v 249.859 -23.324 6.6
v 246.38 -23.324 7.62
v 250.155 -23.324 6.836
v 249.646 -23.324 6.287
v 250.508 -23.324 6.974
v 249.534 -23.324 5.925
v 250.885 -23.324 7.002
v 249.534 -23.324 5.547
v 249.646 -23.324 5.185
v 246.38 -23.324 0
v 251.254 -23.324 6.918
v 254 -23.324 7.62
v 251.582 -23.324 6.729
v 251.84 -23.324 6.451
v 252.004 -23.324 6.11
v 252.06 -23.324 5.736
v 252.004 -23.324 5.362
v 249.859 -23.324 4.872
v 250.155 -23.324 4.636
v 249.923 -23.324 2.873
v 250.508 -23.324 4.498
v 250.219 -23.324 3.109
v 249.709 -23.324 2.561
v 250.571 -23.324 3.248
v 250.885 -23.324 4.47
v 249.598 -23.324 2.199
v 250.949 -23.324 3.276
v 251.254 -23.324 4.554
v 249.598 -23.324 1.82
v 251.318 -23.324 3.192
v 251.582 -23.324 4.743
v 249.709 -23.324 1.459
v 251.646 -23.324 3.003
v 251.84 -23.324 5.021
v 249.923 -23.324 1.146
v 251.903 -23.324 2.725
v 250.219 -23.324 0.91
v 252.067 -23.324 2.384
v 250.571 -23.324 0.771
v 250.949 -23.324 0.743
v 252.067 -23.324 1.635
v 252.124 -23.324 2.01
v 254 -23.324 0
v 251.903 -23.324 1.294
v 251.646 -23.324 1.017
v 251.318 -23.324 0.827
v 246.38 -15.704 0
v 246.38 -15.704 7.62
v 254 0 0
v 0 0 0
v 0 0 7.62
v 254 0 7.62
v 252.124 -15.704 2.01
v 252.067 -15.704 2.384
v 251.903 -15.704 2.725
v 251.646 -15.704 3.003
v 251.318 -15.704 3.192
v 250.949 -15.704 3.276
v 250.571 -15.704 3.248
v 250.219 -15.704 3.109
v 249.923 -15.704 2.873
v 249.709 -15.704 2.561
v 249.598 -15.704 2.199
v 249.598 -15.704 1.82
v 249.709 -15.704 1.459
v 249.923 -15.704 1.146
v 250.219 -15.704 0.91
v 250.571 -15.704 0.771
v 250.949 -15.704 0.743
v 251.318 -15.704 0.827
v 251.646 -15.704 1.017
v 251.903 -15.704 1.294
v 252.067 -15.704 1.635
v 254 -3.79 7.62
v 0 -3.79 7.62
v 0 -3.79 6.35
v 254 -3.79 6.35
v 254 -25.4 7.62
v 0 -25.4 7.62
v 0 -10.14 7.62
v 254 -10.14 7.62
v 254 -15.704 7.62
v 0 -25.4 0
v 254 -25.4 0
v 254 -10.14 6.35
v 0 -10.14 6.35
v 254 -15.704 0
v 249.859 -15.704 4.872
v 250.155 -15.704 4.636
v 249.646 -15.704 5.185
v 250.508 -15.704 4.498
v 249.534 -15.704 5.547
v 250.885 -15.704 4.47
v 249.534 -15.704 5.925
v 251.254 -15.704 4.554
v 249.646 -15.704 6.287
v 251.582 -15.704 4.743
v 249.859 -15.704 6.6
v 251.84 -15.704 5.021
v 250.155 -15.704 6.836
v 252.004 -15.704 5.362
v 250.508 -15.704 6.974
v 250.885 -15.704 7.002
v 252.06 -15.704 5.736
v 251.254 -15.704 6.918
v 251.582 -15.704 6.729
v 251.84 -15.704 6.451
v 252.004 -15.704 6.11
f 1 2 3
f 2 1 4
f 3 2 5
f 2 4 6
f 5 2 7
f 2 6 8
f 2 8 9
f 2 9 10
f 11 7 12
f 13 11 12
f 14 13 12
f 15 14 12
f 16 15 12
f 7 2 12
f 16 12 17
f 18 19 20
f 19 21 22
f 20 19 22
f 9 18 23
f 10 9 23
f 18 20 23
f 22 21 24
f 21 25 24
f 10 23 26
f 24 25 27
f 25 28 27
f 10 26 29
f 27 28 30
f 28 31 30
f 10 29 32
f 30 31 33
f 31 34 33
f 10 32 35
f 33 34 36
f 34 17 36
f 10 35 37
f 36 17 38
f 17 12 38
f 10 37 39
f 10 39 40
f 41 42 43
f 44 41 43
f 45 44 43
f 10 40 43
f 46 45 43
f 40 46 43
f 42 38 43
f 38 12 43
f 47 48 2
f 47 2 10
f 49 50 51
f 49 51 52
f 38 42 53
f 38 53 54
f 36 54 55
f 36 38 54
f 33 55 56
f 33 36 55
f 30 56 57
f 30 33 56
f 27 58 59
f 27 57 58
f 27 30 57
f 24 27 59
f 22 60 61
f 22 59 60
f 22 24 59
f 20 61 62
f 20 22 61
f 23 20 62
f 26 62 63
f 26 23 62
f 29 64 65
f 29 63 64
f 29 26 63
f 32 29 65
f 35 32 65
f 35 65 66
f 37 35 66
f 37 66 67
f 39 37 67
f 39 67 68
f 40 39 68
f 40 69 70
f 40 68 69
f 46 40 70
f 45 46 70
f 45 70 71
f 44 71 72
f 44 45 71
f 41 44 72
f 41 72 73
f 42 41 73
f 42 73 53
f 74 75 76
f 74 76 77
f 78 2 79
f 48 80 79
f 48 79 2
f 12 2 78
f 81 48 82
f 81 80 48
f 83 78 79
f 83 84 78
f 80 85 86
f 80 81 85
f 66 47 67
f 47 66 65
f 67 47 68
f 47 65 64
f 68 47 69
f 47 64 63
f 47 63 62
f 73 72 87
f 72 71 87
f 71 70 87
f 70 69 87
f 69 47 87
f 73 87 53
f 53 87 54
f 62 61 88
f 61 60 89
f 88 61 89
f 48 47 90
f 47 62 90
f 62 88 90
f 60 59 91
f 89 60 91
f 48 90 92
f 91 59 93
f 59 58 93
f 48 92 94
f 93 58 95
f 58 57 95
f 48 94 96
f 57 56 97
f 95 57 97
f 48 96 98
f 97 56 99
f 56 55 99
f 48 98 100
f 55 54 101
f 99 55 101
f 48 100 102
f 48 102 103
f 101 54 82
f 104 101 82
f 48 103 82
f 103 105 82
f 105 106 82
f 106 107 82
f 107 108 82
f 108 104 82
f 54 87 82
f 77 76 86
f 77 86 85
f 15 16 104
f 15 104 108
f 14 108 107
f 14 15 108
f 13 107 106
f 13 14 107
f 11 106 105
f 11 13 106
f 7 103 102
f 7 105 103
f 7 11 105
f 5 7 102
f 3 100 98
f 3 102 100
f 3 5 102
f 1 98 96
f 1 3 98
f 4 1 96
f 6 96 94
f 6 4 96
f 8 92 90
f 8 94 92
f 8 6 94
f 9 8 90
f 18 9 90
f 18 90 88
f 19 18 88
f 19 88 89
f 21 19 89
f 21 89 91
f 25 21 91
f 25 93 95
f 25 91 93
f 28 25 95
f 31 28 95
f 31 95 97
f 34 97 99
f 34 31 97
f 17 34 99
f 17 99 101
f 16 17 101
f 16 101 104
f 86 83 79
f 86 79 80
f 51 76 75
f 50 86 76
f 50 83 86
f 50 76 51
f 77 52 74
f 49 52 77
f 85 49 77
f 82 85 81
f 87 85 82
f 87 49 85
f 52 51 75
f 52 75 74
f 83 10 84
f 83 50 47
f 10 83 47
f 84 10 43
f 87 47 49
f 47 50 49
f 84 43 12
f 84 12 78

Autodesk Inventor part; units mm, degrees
ref_plane "YZ Plane" through (0, 0, 0) normal (1, 0, 0) x (0, 1, 0)
ref_plane "XZ Plane" through (0, 0, 0) normal (0, 1, 0) x (-1, 0, 0)
ref_plane "XY Plane" through (0, 0, 0) normal (0, 0, 1) x (1, 0, 0)
sketch "Sketch1" plane through (0, 0, 0) normal (0, 0, 1) x (1, 0, 0)
  line L0 (0, 0) -> (254, 0)
  line L1 (254, 0) -> (254, -25.4)
  line L2 (254, -25.4) -> (0, -25.4)
  line L3 (0, -25.4) -> (0, 0)
  dimension "d0" = 254
  dimension "d1" = 25.4
extrude "Extrusion1" add sketch "Sketch1" along normal blind 7.62
sketch "Sketch2" plane through (0, 0, 7.62) normal (0, 0, 1) x (1, 0, 0)
  line L0 (0, -25.4) -> (0, 0) projected
  line L1 (0, -3.7895) -> (254, -3.7895)
  line L2 (254, -3.7895) -> (254, -10.1395)
  line L3 (254, -10.1395) -> (0, -10.1395)
  line L4 (0, -10.1395) -> (0, -3.7895)
  dimension "d4" = 254
  dimension "d5" = 6.35
extrude "Extrusion2" cut sketch "Sketch2" against normal blind 1.27
sketch "Sketch3" plane through (254, -25.4, 0) normal (1, 0, 0) x (0, 0, -1)
  line L0 (-7.62, 15.2605) -> (-7.62, 0) projected
  line L1 (-7.62, 2.0757) -> (0, 2.0757)
  line L2 (0, 2.0757) -> (0, 9.6957)
  line L3 (0, 9.6957) -> (-7.62, 9.6957)
  line L4 (-7.62, 9.6957) -> (-7.62, 2.0757)
  dimension "d8" = 7.62
  dimension "d9" = 7.62
extrude "Extrusion3" cut sketch "Sketch3" against normal blind 7.62
sketch "Sketch4" plane through (254, -23.3243, 7.62) normal (0, 1, 0) x (1, 0, 0)
  circle A0 centre (-3.2098, 1.884) radius 1.27
  circle A1 centre (-3.1463, 5.6104) radius 1.27
  point P0 (-254, 7.62)
extrude "Extrusion4" add sketch "Sketch4" along normal blind 7.62
properties part number "Bar"
